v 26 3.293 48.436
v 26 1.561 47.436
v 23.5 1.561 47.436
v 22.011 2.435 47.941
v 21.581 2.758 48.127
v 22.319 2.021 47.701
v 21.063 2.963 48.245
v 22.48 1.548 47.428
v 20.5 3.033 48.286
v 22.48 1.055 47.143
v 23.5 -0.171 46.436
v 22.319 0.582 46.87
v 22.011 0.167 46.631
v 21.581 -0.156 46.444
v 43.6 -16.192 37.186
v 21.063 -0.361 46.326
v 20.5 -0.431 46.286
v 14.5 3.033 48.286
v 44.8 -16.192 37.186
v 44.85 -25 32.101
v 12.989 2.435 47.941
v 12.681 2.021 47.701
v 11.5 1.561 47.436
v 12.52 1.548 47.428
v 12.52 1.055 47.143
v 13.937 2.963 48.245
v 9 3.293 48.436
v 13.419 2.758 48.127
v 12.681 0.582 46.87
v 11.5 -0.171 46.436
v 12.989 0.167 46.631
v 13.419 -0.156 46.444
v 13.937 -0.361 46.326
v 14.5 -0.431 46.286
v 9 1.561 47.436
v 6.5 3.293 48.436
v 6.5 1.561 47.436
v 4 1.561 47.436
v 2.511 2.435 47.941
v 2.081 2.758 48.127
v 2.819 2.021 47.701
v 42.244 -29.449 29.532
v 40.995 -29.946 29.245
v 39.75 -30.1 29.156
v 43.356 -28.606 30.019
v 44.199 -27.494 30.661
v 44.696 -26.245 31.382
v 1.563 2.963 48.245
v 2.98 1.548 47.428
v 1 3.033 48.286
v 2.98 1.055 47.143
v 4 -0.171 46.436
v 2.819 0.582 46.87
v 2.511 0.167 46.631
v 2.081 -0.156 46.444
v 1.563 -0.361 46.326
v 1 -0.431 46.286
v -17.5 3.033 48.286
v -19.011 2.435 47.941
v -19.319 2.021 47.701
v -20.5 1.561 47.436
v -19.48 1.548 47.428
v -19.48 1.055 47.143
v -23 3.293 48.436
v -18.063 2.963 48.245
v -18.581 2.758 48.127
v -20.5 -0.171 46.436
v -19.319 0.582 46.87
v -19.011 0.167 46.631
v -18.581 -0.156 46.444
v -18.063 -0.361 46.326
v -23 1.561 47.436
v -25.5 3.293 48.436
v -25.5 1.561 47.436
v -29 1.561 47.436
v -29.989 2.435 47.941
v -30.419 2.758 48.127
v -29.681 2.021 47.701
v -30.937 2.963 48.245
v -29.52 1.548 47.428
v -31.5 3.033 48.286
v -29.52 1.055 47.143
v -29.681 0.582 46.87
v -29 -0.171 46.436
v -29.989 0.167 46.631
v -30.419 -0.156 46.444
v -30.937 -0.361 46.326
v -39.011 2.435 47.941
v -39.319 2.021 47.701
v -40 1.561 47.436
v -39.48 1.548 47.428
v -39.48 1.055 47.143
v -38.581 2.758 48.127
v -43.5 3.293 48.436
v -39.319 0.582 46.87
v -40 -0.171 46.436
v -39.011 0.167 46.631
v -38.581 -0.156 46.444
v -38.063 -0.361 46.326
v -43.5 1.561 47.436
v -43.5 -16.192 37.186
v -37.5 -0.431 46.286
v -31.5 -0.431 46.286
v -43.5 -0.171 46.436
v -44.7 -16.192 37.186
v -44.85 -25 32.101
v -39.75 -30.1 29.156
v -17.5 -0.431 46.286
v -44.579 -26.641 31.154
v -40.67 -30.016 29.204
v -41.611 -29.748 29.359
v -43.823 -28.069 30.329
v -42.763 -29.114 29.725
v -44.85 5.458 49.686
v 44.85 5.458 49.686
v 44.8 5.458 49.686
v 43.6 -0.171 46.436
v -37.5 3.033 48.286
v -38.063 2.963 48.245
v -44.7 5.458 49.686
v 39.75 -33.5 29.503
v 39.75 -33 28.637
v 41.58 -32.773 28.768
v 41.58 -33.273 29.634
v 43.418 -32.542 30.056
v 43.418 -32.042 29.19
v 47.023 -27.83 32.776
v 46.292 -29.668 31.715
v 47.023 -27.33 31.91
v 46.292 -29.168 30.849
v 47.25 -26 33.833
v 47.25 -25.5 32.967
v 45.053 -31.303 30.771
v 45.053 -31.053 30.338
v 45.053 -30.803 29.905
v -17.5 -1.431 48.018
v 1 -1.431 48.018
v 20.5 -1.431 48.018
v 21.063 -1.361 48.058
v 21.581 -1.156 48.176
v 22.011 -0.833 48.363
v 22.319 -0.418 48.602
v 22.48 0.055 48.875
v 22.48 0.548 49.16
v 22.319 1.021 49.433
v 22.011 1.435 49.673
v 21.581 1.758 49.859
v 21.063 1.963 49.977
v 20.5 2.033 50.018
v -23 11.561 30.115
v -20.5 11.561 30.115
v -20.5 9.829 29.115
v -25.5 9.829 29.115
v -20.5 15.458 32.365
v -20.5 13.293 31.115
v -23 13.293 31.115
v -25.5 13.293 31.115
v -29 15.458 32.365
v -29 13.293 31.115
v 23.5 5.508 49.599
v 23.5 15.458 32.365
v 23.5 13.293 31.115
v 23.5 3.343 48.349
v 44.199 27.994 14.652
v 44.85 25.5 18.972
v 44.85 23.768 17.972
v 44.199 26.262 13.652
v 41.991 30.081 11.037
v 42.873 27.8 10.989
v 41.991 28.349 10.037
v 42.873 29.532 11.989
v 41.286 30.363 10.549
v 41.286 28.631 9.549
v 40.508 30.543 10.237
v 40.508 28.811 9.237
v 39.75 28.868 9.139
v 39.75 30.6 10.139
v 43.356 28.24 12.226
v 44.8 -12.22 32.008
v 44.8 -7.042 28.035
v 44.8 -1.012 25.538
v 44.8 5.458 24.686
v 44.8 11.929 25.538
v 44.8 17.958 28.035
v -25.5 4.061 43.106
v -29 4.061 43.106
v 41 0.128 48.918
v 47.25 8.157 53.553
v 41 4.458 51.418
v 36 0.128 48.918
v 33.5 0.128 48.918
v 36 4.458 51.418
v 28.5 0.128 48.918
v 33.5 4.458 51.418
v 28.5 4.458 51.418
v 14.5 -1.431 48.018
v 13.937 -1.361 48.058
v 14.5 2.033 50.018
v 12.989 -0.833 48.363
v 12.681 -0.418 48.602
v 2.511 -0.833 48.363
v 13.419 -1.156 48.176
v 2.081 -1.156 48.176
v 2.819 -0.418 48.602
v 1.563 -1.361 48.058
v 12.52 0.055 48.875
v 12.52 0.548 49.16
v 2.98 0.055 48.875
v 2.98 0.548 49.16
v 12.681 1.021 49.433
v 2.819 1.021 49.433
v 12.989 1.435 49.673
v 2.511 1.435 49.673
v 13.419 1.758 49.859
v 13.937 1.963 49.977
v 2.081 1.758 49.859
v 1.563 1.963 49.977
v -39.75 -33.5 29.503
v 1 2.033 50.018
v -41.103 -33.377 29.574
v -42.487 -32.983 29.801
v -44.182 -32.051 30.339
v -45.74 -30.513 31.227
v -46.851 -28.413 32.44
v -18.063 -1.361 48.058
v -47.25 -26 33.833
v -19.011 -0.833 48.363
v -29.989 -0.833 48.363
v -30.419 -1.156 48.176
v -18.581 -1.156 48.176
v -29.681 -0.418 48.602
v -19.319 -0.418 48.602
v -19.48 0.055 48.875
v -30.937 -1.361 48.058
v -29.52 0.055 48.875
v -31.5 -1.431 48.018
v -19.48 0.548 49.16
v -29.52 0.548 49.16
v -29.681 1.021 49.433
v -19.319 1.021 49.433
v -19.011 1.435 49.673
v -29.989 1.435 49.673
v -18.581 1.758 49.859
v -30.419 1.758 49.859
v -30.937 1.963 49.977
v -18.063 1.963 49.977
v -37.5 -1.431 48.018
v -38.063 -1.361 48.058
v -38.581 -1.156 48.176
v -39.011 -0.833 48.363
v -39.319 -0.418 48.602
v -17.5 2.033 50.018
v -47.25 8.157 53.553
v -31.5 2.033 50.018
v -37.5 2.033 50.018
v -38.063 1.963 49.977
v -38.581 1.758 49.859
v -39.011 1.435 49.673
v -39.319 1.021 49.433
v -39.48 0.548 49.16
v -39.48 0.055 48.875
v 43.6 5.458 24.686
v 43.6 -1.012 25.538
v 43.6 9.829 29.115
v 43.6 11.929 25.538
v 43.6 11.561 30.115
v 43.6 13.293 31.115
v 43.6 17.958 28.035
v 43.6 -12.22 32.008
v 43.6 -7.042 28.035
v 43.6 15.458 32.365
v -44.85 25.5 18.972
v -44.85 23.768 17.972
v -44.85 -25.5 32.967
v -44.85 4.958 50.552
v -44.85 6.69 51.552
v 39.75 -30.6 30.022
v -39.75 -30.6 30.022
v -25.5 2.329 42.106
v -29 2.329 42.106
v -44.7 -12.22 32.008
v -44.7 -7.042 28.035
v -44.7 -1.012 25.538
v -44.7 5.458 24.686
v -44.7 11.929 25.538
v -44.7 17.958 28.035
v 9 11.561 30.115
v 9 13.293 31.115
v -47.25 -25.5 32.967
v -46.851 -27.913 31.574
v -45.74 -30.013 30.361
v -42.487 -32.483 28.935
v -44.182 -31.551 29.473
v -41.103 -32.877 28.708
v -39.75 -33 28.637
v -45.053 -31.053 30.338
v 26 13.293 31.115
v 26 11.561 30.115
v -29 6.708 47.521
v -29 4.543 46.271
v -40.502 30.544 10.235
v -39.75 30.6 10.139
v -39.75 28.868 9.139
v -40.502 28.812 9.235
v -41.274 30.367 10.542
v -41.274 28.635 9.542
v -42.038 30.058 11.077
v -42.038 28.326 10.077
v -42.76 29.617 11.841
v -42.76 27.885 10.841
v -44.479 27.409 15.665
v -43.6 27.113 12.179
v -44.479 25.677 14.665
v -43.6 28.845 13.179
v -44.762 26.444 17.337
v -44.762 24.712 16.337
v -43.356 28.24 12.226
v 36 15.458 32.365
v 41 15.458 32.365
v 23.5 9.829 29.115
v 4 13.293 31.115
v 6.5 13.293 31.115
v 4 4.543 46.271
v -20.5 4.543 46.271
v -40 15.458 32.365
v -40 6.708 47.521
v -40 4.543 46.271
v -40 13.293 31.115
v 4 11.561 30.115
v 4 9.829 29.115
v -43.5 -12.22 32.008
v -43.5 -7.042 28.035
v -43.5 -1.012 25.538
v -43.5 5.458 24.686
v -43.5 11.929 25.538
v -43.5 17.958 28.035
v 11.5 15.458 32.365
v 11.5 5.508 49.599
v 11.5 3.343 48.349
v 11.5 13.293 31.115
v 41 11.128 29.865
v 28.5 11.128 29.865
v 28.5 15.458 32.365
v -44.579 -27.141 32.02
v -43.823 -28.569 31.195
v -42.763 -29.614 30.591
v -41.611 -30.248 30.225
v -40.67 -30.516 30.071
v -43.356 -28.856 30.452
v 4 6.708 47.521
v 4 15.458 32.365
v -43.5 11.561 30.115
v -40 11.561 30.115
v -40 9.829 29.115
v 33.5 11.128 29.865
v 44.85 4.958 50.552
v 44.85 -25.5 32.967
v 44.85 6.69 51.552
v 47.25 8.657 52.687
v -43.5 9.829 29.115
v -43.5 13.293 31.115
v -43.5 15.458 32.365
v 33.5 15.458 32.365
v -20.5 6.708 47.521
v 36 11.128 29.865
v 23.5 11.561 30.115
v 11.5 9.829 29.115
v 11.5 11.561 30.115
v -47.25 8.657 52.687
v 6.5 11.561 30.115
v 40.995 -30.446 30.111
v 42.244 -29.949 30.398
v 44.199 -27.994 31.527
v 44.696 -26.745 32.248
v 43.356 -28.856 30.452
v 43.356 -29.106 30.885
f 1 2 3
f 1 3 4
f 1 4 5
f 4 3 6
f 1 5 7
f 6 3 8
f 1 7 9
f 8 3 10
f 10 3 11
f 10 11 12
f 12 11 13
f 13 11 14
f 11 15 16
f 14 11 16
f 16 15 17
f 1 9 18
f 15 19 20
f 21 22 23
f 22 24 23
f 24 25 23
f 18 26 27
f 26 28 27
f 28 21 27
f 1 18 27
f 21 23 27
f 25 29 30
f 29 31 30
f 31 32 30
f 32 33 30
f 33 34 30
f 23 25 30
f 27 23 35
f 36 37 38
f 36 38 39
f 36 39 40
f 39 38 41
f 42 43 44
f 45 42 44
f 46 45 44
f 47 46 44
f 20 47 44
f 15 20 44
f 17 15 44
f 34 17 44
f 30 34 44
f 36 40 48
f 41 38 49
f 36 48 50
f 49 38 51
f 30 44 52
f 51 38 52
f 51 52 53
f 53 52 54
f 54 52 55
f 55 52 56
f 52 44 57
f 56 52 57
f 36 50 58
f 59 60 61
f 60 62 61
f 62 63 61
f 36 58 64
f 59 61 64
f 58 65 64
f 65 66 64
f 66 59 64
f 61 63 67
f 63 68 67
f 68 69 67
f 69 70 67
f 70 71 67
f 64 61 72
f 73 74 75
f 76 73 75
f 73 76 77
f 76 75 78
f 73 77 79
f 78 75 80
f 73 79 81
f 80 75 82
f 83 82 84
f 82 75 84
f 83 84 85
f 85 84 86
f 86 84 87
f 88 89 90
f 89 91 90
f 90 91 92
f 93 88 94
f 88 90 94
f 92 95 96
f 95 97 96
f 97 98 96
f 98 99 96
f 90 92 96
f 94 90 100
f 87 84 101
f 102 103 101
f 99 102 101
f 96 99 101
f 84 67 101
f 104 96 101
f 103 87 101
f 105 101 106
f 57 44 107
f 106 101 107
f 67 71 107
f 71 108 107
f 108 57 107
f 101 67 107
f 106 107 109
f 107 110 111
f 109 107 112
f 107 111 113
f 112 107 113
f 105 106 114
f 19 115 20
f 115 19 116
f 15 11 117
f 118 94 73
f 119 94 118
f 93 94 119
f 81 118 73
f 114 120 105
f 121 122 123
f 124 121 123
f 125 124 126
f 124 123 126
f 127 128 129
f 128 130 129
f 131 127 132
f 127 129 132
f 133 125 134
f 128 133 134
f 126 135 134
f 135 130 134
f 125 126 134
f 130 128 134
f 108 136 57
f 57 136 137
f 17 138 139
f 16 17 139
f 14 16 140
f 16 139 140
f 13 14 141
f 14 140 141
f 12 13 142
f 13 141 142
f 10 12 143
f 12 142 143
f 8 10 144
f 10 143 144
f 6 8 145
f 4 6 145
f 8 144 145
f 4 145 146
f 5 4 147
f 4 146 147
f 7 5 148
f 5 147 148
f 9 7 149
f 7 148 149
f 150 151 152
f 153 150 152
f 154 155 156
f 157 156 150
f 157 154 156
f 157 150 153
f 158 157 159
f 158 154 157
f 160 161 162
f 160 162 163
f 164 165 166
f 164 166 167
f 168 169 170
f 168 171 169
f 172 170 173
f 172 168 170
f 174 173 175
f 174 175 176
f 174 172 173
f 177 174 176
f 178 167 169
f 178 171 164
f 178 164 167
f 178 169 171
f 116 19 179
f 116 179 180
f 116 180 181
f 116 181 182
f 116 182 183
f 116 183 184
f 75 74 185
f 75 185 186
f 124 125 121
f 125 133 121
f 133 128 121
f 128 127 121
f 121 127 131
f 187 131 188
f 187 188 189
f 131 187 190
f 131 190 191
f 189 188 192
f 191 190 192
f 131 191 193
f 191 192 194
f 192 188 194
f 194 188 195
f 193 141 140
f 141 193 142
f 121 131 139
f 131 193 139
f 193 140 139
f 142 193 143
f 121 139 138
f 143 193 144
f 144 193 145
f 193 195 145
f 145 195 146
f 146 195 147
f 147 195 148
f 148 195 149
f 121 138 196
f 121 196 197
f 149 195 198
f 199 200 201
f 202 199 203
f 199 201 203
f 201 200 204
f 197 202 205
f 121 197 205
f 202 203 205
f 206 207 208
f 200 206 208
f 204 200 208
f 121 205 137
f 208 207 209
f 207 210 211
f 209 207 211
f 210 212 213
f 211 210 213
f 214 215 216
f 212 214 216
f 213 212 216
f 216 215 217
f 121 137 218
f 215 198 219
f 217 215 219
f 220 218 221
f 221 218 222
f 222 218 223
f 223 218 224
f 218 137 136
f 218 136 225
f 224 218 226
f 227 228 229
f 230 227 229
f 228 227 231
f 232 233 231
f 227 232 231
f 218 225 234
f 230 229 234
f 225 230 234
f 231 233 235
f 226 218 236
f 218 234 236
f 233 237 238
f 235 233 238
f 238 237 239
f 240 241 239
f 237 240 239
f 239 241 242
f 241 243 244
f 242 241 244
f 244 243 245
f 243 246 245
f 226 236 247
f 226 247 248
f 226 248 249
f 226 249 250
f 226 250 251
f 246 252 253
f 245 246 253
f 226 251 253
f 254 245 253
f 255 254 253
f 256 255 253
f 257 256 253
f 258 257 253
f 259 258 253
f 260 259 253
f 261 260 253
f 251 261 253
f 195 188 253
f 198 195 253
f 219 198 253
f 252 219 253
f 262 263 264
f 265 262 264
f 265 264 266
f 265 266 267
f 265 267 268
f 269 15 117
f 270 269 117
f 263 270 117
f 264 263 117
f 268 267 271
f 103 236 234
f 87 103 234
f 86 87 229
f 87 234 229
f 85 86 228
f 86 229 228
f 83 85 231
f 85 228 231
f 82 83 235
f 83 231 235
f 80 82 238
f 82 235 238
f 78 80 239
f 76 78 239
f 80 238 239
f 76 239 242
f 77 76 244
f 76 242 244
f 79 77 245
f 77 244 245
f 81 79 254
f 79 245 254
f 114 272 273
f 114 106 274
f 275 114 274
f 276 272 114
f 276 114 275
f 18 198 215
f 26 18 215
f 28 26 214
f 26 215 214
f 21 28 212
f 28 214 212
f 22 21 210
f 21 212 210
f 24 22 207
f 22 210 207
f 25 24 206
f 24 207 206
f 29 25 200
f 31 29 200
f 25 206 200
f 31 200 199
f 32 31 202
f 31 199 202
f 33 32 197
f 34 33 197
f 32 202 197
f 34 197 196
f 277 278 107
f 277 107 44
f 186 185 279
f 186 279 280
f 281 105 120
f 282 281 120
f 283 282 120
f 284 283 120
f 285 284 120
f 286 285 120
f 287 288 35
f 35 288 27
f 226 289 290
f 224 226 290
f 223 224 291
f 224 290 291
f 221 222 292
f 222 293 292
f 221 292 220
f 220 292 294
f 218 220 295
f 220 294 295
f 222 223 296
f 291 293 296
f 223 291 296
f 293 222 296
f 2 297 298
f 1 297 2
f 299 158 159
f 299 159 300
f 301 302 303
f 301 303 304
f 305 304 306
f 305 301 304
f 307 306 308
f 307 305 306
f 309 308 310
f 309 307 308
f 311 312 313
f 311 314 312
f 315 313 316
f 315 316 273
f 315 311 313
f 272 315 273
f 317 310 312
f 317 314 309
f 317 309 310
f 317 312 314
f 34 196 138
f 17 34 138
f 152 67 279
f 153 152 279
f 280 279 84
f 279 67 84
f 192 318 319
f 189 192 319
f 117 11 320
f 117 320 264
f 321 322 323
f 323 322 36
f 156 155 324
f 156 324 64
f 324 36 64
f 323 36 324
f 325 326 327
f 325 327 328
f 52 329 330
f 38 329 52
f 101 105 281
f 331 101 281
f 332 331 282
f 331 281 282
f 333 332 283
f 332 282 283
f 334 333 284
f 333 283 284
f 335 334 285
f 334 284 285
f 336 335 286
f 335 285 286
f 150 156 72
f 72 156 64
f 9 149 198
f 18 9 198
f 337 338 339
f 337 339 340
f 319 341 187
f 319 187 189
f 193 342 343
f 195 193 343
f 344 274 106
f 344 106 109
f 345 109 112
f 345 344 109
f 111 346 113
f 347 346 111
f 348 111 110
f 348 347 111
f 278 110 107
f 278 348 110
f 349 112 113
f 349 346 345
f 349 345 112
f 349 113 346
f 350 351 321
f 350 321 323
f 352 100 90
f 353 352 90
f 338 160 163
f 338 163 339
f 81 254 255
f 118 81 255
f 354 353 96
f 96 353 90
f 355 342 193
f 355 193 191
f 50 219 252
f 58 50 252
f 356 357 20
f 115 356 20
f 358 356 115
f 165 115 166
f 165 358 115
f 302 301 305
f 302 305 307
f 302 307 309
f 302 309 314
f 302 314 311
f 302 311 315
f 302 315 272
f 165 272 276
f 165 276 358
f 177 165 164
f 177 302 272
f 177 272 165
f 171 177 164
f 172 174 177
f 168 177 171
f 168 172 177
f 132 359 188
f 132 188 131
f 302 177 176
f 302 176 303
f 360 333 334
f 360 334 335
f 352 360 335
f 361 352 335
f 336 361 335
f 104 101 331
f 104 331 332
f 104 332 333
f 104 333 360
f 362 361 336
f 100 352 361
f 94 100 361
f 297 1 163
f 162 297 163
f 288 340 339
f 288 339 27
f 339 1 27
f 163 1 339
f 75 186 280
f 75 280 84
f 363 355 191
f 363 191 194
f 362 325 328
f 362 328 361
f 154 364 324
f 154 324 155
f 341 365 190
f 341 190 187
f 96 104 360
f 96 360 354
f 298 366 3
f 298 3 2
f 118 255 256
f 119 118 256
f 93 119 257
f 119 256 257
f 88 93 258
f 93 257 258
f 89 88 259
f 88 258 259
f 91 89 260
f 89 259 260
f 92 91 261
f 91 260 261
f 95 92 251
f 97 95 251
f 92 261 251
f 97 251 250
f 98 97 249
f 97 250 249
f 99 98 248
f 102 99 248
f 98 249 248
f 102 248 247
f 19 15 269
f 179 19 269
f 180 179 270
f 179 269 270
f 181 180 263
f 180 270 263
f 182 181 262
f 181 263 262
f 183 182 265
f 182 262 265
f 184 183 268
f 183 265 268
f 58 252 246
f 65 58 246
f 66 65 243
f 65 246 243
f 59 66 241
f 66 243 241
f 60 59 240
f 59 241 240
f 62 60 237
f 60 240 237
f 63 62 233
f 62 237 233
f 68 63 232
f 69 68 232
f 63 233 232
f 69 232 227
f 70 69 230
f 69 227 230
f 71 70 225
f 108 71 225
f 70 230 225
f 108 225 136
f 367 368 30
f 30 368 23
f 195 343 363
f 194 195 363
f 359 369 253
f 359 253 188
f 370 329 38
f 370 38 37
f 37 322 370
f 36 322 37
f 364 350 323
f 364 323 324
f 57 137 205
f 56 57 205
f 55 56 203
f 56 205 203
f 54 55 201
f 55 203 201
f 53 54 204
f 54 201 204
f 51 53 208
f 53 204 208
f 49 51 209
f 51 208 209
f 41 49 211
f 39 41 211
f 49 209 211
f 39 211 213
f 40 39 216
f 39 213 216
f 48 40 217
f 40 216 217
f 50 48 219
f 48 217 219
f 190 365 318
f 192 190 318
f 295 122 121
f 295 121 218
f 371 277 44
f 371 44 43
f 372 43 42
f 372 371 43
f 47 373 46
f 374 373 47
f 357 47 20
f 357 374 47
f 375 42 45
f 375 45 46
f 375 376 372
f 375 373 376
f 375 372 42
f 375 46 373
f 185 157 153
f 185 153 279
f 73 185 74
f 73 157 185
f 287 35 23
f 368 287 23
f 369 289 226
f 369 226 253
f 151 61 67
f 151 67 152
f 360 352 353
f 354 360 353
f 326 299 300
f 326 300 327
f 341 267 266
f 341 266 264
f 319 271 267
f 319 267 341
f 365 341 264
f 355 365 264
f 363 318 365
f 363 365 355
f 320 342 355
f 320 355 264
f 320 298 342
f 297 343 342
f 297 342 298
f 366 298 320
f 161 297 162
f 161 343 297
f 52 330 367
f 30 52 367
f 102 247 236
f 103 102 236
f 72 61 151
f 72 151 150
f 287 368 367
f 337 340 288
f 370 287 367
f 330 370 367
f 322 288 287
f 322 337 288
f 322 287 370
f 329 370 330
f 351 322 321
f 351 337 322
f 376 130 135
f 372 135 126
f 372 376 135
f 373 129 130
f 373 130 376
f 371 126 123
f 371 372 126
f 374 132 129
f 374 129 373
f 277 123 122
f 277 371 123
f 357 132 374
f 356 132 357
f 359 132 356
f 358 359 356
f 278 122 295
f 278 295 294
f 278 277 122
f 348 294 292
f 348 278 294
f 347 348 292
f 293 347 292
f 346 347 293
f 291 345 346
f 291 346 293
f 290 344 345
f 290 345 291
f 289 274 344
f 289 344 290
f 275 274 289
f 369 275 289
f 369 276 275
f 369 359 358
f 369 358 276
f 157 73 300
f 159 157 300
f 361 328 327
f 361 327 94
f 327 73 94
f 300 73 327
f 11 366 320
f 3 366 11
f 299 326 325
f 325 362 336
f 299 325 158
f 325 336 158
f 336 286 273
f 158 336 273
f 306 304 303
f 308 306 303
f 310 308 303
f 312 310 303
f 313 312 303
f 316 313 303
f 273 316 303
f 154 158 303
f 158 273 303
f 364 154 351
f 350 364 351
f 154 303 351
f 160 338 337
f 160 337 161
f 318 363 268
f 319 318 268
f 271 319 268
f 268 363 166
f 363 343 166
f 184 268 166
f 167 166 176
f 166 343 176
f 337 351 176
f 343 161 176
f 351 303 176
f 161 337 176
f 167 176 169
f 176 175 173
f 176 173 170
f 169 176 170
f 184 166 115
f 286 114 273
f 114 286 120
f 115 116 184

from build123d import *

# Parameters (mm, degrees)
SKETCH020_AS_DRAWN_W                      = 5
SKETCH020_AS_DRAWN_H                      = 5
EXTRUDE021_DEPTH                          = 25
EXTRUDE021_ONTO_SKETCH020_PLACEMENT_ANGLE = 30
SKETCH018_AS_DRAWN_W                      = 17.6
SKETCH018_AS_DRAWN_H                      = 20
SKETCH018_AS_DRAWN_W_2                    = 2.5
EXTRUDE019_DEPTH                          = 2
EXTRUDE019_ONTO_SKETCH018_PLACEMENT_ANGLE = 120
EXTRUDE018_DEPTH                          = 2.5
EXTRUDE018_ONTO_SKETCH017_PLACEMENT_ANGLE = 120
EXTRUDE017_DEPTH                          = 1.2
EXTRUDE016_DEPTH                          = 1.2
EXTRUDE014_DEPTH                          = 1
EXTRUDE015_DEPTH                          = 1
EXTRUDE015_ONTO_SKETCH015_PLACEMENT_ANGLE = 30
EXTRUDE013_DEPTH                          = 2
SKETCH019_AS_DRAWN_W                      = 3.5
SKETCH019_AS_DRAWN_H                      = 20
SKETCH019_AS_DRAWN_W_2                    = 7.5
SKETCH019_AS_DRAWN_W_3                    = 20.1
EXTRUDE020_DEPTH                          = 2
EXTRUDE020_ONTO_SKETCH019_PLACEMENT_ANGLE = 120


with BuildPart() as extrude021:
    # Sketch020 as drawn → Extrude021 (new)
    with BuildSketch(Plane.XY):
        with BuildLine():
            ThreePointArc((-17.5, 26.7697348593), (-19.5, 24.7697348593), (-17.5, 22.7697348593))
            Line((-17.5, 22.7697348593), (1, 22.7697348593))
            ThreePointArc((1, 22.7697348593), (3, 24.7697348593), (1, 26.7697348593))
            Line((1, 26.7697348593), (-17.5, 26.7697348593))
        make_face()
        with BuildLine():
            ThreePointArc((-31.5, 22.7697348593), (-29.5, 24.7697348593), (-31.5, 26.7697348593))
            Line((-31.5, 26.7697348593), (-37.5, 26.7697348593))
            ThreePointArc((-37.5, 26.7697348593), (-39.5, 24.7697348593), (-37.5, 22.7697348593))
            Line((-37.5, 22.7697348593), (-31.5, 22.7697348593))
        make_face()
        with BuildLine():
            ThreePointArc((14.5, 26.7697348593), (12.5, 24.7697348593), (14.5, 22.7697348593))
            Line((14.5, 22.7697348593), (20.5, 22.7697348593))
            ThreePointArc((20.5, 22.7697348593), (22.5, 24.7697348593), (20.5, 26.7697348593))
            Line((20.5, 26.7697348593), (14.5, 26.7697348593))
        make_face()
        with Locations((31, 27.0697348593)):
            Rectangle(SKETCH020_AS_DRAWN_W, SKETCH020_AS_DRAWN_H)
        with Locations((38.5, 27.0697348593)):
            Rectangle(SKETCH020_AS_DRAWN_W, SKETCH020_AS_DRAWN_H)
    extrude(amount=-EXTRUDE021_DEPTH)


with BuildPart() as extrude021_1:
    # Extrude021 onto Sketch020 placement: moved
    add(extrude021.part.moved(Location((0, -21.15, 36.6328745801))).rotate(Axis((0, -21.15, 36.6328745801), (1, 0, 0)), EXTRUDE021_ONTO_SKETCH020_PLACEMENT_ANGLE))


with BuildPart() as extrude019:
    # Sketch018 as drawn → Extrude019 (new)
    with BuildSketch(Plane.XY):
        with Locations((34.8, 30.3)):
            Rectangle(SKETCH018_AS_DRAWN_W, SKETCH018_AS_DRAWN_H)
        with Locations((-24.25, 30.3)):
            Rectangle(SKETCH018_AS_DRAWN_W_2, SKETCH018_AS_DRAWN_H)
        with Locations((7.75, 30.3)):
            Rectangle(SKETCH018_AS_DRAWN_W_2, SKETCH018_AS_DRAWN_H)
    extrude(amount=EXTRUDE019_DEPTH)


with BuildPart() as extrude019_1:
    # Extrude019 onto Sketch018 placement: moved
    add(extrude019.part.moved(Location((0, 23.4430780618, 13.5348674296))).rotate(Axis((0, 23.4430780618, 13.5348674296), (1, 0, 0)), EXTRUDE019_ONTO_SKETCH018_PLACEMENT_ANGLE))


with BuildPart() as extrude018:
    # Sketch017 as drawn → Extrude018 (new)
    with BuildSketch(Plane.XY):
        Polygon((-43.5, 40.3), (43.6, 40.3), (43.6, 20.3), (23.5, 20.3), (23.5, 40.2), (11.5, 40.2), (11.5, 20.3), (4, 20.3), (4, 37.8), (-20.5, 37.8), (-20.5, 20.3), (-29, 20.3), (-29, 37.8), (-40, 37.8), (-40, 20.3), (-43.5, 20.3), align=None)
    extrude(amount=EXTRUDE018_DEPTH)


with BuildPart() as extrude018_1:
    # Extrude018 onto Sketch017 placement: moved
    add(extrude018.part.moved(Location((0, 25.6081415713, 14.7848674296))).rotate(Axis((0, 25.6081415713, 14.7848674296), (1, 0, 0)), EXTRUDE018_ONTO_SKETCH017_PLACEMENT_ANGLE))


with BuildPart() as extrude017:
    # Sketch016 → Extrude017 (new body)
    with BuildSketch(Plane.YZ):
        with BuildLine():
            Line((5.4581415713, 49.6856912021), (-16.1924935233, 37.1856912021))
            ThreePointArc((-16.1924935233, 37.1856912021), (-1.0123345563, 25.5375455449), (17.9581415713, 28.0350561075))
            Line((5.4581415713, 49.6856912021), (17.9581415713, 28.0350561075))
        make_face()
    extrude(amount=EXTRUDE017_DEPTH)


with BuildPart() as extrude017_1:
    # Extrude017 placement: moved
    add(extrude017.part.moved(Location((-44.7, 0, 0))))


with BuildPart() as extrude016:
    # Sketch016 → Extrude016 (new body)
    with BuildSketch(Plane.YZ):
        with BuildLine():
            Line((5.4581415713, 49.6856912021), (-16.1924935233, 37.1856912021))
            ThreePointArc((-16.1924935233, 37.1856912021), (-1.0123345563, 25.5375455449), (17.9581415713, 28.0350561075))
            Line((5.4581415713, 49.6856912021), (17.9581415713, 28.0350561075))
        make_face()
    extrude(amount=EXTRUDE016_DEPTH)


with BuildPart() as extrude016_1:
    # Extrude016 placement: moved
    add(extrude016.part.moved(Location((43.6, 0, 0))))


with BuildPart() as extrude014:
    # Facebinder001 → Extrude014 (new body)
    with BuildSketch(Plane(origin=(0, -11.8962827712, 40.8208101747), x_dir=(-1, 0, 0), z_dir=(0, -0.5, 0.8660254038))):
        with BuildLine():
            Line((44.85, -21.4618128624), (44.85, 15.708219608))
            add(Edge.make_bspline(
                [(44.85, 15.708219608), (44.85, 21.5971923538), (39.75, 21.5971923538)],
                knots=[4.7123889804, 4.7123889804, 4.7123889804, 6.2831853072, 6.2831853072, 6.2831853072], degree=2, weights=[1, 0.7071067812, 1]))
            Line((39.75, 21.5971923538), (-39.75, 21.5971923538))
            add(Edge.make_bspline(
                [(-39.75, 21.5971923538), (-44.85, 21.5971923538), (-44.85, 15.708219608)],
                knots=[0, 0, 0, 1.5707963268, 1.5707963268, 1.5707963268], degree=2, weights=[1, 0.7071067812, 1]))
            Line((-44.85, 15.708219608), (-44.85, -21.4618128624))
            Line((-44.85, -21.4618128624), (44.85, -21.4618128624))
        make_face()
    extrude(amount=-EXTRUDE014_DEPTH)


with BuildPart() as extrude015:
    # Sketch015 as drawn → Extrude015 (new)
    with BuildSketch(Plane.XY):
        with BuildLine():
            Line((-47.25, -5.6002976111), (-47.25, 31.8410161514))
            Line((-47.25, 31.8410161514), (-47.25, 33.8410161514))
            Line((-47.25, 33.8410161514), (-45.25, 33.8410161514))
            Line((-45.25, 33.8410161514), (45.25, 33.8410161514))
            Line((45.25, 33.8410161514), (47.25, 33.8410161514))
            Line((47.25, 33.8410161514), (47.25, 31.8410161514))
            Line((47.25, 31.8410161514), (47.25, -5.6002976111))
            add(Edge.make_bspline(
                [(39.75, -14.260551649), (47.25, -14.260551649), (47.25, -5.6002976111)],
                knots=[0, 0, 0, 1.5707963268, 1.5707963268, 1.5707963268], degree=2, weights=[1, 0.7071067812, 1]))
            Line((39.75, -14.260551649), (-39.75, -14.260551649))
            add(Edge.make_bspline(
                [(-47.25, -5.6002976111), (-47.25, -14.260551649), (-39.75, -14.260551649)],
                knots=[4.7123889804, 4.7123889804, 4.7123889804, 6.2831853072, 6.2831853072, 6.2831853072], degree=2, weights=[1, 0.7071067812, 1]))
        make_face()
    extrude(amount=EXTRUDE015_DEPTH)


with BuildPart() as extrude015_1:
    # Extrude015 onto Sketch015 placement: moved
    add(extrude015.part.moved(Location((0, -20.65, 35.7668491763))).rotate(Axis((0, -20.65, 35.7668491763), (1, 0, 0)), EXTRUDE015_ONTO_SKETCH015_PLACEMENT_ANGLE))


with BuildPart() as inner_complete:
    # Facebinder → Extrude013 (new body)
    with BuildSketch(Plane(origin=(0, 18.5885038732, 30.9432365735), x_dir=(1, 0, 0), z_dir=(0, 0.8660254038, 0.5))):
        with BuildLine():
            Line((39.75, 24.0229922536), (-39.75, 24.0229922536))
            add(Edge.make_bspline(
                [(-39.75, 24.0229922536), (-44.85, 24.0229922536), (-44.85, 13.8229922536)],
                knots=[0, 0, 0, 1.5707963268, 1.5707963268, 1.5707963268], degree=2, weights=[1, 0.7071067812, 1]))
            Line((-44.85, 13.8229922536), (-44.85, -23.7966229887))
            Line((-44.85, -23.7966229887), (44.85, -23.7966229887))
            Line((44.85, -23.7966229887), (44.85, 13.8229922536))
            add(Edge.make_bspline(
                [(44.85, 13.8229922536), (44.85, 24.0229922536), (39.75, 24.0229922536)],
                knots=[4.7123889804, 4.7123889804, 4.7123889804, 6.2831853072, 6.2831853072, 6.2831853072], degree=2, weights=[1, 0.7071067812, 1]))
        make_face()
    extrude(amount=-EXTRUDE013_DEPTH)

    # Connect003: union Extrude014, Extrude015
    add(extrude014.part)
    add(extrude015_1.part)


with BuildPart() as cut006:
    # Sketch019 as drawn → Extrude020 (new)
    with BuildSketch(Plane.XY):
        with Locations((-41.75, 30.3)):
            Rectangle(SKETCH019_AS_DRAWN_W, SKETCH019_AS_DRAWN_H)
        Polygon((-29, 40.3), (-20.5, 40.3), (-20.5, 20.3), (-25.5, 20.3), (-25.5, 35.3), (-29, 35.3), align=None)
        with Locations((7.75, 30.3)):
            Rectangle(SKETCH019_AS_DRAWN_W_2, SKETCH019_AS_DRAWN_H)
        with Locations((33.55, 30.3)):
            Rectangle(SKETCH019_AS_DRAWN_W_3, SKETCH019_AS_DRAWN_H)
    extrude(amount=EXTRUDE020_DEPTH)


with BuildPart() as cut006_1:
    # Extrude020 onto Sketch019 placement: moved
    add(cut006.part.moved(Location((0, 21.7110272543, 12.5348674296))).rotate(Axis((0, 21.7110272543, 12.5348674296), (1, 0, 0)), EXTRUDE020_ONTO_SKETCH019_PLACEMENT_ANGLE))

    # Connect004: union Extrude019, Extrude018, Extrude017, Extrude016, inner_complete
    add(extrude019_1.part)
    add(extrude018_1.part)
    add(extrude017_1.part)
    add(extrude016_1.part)
    add(inner_complete.part)

    # Cut006: cut Extrude021
    add(extrude021_1.part, mode=Mode.SUBTRACT)


solid = cut006_1.part
